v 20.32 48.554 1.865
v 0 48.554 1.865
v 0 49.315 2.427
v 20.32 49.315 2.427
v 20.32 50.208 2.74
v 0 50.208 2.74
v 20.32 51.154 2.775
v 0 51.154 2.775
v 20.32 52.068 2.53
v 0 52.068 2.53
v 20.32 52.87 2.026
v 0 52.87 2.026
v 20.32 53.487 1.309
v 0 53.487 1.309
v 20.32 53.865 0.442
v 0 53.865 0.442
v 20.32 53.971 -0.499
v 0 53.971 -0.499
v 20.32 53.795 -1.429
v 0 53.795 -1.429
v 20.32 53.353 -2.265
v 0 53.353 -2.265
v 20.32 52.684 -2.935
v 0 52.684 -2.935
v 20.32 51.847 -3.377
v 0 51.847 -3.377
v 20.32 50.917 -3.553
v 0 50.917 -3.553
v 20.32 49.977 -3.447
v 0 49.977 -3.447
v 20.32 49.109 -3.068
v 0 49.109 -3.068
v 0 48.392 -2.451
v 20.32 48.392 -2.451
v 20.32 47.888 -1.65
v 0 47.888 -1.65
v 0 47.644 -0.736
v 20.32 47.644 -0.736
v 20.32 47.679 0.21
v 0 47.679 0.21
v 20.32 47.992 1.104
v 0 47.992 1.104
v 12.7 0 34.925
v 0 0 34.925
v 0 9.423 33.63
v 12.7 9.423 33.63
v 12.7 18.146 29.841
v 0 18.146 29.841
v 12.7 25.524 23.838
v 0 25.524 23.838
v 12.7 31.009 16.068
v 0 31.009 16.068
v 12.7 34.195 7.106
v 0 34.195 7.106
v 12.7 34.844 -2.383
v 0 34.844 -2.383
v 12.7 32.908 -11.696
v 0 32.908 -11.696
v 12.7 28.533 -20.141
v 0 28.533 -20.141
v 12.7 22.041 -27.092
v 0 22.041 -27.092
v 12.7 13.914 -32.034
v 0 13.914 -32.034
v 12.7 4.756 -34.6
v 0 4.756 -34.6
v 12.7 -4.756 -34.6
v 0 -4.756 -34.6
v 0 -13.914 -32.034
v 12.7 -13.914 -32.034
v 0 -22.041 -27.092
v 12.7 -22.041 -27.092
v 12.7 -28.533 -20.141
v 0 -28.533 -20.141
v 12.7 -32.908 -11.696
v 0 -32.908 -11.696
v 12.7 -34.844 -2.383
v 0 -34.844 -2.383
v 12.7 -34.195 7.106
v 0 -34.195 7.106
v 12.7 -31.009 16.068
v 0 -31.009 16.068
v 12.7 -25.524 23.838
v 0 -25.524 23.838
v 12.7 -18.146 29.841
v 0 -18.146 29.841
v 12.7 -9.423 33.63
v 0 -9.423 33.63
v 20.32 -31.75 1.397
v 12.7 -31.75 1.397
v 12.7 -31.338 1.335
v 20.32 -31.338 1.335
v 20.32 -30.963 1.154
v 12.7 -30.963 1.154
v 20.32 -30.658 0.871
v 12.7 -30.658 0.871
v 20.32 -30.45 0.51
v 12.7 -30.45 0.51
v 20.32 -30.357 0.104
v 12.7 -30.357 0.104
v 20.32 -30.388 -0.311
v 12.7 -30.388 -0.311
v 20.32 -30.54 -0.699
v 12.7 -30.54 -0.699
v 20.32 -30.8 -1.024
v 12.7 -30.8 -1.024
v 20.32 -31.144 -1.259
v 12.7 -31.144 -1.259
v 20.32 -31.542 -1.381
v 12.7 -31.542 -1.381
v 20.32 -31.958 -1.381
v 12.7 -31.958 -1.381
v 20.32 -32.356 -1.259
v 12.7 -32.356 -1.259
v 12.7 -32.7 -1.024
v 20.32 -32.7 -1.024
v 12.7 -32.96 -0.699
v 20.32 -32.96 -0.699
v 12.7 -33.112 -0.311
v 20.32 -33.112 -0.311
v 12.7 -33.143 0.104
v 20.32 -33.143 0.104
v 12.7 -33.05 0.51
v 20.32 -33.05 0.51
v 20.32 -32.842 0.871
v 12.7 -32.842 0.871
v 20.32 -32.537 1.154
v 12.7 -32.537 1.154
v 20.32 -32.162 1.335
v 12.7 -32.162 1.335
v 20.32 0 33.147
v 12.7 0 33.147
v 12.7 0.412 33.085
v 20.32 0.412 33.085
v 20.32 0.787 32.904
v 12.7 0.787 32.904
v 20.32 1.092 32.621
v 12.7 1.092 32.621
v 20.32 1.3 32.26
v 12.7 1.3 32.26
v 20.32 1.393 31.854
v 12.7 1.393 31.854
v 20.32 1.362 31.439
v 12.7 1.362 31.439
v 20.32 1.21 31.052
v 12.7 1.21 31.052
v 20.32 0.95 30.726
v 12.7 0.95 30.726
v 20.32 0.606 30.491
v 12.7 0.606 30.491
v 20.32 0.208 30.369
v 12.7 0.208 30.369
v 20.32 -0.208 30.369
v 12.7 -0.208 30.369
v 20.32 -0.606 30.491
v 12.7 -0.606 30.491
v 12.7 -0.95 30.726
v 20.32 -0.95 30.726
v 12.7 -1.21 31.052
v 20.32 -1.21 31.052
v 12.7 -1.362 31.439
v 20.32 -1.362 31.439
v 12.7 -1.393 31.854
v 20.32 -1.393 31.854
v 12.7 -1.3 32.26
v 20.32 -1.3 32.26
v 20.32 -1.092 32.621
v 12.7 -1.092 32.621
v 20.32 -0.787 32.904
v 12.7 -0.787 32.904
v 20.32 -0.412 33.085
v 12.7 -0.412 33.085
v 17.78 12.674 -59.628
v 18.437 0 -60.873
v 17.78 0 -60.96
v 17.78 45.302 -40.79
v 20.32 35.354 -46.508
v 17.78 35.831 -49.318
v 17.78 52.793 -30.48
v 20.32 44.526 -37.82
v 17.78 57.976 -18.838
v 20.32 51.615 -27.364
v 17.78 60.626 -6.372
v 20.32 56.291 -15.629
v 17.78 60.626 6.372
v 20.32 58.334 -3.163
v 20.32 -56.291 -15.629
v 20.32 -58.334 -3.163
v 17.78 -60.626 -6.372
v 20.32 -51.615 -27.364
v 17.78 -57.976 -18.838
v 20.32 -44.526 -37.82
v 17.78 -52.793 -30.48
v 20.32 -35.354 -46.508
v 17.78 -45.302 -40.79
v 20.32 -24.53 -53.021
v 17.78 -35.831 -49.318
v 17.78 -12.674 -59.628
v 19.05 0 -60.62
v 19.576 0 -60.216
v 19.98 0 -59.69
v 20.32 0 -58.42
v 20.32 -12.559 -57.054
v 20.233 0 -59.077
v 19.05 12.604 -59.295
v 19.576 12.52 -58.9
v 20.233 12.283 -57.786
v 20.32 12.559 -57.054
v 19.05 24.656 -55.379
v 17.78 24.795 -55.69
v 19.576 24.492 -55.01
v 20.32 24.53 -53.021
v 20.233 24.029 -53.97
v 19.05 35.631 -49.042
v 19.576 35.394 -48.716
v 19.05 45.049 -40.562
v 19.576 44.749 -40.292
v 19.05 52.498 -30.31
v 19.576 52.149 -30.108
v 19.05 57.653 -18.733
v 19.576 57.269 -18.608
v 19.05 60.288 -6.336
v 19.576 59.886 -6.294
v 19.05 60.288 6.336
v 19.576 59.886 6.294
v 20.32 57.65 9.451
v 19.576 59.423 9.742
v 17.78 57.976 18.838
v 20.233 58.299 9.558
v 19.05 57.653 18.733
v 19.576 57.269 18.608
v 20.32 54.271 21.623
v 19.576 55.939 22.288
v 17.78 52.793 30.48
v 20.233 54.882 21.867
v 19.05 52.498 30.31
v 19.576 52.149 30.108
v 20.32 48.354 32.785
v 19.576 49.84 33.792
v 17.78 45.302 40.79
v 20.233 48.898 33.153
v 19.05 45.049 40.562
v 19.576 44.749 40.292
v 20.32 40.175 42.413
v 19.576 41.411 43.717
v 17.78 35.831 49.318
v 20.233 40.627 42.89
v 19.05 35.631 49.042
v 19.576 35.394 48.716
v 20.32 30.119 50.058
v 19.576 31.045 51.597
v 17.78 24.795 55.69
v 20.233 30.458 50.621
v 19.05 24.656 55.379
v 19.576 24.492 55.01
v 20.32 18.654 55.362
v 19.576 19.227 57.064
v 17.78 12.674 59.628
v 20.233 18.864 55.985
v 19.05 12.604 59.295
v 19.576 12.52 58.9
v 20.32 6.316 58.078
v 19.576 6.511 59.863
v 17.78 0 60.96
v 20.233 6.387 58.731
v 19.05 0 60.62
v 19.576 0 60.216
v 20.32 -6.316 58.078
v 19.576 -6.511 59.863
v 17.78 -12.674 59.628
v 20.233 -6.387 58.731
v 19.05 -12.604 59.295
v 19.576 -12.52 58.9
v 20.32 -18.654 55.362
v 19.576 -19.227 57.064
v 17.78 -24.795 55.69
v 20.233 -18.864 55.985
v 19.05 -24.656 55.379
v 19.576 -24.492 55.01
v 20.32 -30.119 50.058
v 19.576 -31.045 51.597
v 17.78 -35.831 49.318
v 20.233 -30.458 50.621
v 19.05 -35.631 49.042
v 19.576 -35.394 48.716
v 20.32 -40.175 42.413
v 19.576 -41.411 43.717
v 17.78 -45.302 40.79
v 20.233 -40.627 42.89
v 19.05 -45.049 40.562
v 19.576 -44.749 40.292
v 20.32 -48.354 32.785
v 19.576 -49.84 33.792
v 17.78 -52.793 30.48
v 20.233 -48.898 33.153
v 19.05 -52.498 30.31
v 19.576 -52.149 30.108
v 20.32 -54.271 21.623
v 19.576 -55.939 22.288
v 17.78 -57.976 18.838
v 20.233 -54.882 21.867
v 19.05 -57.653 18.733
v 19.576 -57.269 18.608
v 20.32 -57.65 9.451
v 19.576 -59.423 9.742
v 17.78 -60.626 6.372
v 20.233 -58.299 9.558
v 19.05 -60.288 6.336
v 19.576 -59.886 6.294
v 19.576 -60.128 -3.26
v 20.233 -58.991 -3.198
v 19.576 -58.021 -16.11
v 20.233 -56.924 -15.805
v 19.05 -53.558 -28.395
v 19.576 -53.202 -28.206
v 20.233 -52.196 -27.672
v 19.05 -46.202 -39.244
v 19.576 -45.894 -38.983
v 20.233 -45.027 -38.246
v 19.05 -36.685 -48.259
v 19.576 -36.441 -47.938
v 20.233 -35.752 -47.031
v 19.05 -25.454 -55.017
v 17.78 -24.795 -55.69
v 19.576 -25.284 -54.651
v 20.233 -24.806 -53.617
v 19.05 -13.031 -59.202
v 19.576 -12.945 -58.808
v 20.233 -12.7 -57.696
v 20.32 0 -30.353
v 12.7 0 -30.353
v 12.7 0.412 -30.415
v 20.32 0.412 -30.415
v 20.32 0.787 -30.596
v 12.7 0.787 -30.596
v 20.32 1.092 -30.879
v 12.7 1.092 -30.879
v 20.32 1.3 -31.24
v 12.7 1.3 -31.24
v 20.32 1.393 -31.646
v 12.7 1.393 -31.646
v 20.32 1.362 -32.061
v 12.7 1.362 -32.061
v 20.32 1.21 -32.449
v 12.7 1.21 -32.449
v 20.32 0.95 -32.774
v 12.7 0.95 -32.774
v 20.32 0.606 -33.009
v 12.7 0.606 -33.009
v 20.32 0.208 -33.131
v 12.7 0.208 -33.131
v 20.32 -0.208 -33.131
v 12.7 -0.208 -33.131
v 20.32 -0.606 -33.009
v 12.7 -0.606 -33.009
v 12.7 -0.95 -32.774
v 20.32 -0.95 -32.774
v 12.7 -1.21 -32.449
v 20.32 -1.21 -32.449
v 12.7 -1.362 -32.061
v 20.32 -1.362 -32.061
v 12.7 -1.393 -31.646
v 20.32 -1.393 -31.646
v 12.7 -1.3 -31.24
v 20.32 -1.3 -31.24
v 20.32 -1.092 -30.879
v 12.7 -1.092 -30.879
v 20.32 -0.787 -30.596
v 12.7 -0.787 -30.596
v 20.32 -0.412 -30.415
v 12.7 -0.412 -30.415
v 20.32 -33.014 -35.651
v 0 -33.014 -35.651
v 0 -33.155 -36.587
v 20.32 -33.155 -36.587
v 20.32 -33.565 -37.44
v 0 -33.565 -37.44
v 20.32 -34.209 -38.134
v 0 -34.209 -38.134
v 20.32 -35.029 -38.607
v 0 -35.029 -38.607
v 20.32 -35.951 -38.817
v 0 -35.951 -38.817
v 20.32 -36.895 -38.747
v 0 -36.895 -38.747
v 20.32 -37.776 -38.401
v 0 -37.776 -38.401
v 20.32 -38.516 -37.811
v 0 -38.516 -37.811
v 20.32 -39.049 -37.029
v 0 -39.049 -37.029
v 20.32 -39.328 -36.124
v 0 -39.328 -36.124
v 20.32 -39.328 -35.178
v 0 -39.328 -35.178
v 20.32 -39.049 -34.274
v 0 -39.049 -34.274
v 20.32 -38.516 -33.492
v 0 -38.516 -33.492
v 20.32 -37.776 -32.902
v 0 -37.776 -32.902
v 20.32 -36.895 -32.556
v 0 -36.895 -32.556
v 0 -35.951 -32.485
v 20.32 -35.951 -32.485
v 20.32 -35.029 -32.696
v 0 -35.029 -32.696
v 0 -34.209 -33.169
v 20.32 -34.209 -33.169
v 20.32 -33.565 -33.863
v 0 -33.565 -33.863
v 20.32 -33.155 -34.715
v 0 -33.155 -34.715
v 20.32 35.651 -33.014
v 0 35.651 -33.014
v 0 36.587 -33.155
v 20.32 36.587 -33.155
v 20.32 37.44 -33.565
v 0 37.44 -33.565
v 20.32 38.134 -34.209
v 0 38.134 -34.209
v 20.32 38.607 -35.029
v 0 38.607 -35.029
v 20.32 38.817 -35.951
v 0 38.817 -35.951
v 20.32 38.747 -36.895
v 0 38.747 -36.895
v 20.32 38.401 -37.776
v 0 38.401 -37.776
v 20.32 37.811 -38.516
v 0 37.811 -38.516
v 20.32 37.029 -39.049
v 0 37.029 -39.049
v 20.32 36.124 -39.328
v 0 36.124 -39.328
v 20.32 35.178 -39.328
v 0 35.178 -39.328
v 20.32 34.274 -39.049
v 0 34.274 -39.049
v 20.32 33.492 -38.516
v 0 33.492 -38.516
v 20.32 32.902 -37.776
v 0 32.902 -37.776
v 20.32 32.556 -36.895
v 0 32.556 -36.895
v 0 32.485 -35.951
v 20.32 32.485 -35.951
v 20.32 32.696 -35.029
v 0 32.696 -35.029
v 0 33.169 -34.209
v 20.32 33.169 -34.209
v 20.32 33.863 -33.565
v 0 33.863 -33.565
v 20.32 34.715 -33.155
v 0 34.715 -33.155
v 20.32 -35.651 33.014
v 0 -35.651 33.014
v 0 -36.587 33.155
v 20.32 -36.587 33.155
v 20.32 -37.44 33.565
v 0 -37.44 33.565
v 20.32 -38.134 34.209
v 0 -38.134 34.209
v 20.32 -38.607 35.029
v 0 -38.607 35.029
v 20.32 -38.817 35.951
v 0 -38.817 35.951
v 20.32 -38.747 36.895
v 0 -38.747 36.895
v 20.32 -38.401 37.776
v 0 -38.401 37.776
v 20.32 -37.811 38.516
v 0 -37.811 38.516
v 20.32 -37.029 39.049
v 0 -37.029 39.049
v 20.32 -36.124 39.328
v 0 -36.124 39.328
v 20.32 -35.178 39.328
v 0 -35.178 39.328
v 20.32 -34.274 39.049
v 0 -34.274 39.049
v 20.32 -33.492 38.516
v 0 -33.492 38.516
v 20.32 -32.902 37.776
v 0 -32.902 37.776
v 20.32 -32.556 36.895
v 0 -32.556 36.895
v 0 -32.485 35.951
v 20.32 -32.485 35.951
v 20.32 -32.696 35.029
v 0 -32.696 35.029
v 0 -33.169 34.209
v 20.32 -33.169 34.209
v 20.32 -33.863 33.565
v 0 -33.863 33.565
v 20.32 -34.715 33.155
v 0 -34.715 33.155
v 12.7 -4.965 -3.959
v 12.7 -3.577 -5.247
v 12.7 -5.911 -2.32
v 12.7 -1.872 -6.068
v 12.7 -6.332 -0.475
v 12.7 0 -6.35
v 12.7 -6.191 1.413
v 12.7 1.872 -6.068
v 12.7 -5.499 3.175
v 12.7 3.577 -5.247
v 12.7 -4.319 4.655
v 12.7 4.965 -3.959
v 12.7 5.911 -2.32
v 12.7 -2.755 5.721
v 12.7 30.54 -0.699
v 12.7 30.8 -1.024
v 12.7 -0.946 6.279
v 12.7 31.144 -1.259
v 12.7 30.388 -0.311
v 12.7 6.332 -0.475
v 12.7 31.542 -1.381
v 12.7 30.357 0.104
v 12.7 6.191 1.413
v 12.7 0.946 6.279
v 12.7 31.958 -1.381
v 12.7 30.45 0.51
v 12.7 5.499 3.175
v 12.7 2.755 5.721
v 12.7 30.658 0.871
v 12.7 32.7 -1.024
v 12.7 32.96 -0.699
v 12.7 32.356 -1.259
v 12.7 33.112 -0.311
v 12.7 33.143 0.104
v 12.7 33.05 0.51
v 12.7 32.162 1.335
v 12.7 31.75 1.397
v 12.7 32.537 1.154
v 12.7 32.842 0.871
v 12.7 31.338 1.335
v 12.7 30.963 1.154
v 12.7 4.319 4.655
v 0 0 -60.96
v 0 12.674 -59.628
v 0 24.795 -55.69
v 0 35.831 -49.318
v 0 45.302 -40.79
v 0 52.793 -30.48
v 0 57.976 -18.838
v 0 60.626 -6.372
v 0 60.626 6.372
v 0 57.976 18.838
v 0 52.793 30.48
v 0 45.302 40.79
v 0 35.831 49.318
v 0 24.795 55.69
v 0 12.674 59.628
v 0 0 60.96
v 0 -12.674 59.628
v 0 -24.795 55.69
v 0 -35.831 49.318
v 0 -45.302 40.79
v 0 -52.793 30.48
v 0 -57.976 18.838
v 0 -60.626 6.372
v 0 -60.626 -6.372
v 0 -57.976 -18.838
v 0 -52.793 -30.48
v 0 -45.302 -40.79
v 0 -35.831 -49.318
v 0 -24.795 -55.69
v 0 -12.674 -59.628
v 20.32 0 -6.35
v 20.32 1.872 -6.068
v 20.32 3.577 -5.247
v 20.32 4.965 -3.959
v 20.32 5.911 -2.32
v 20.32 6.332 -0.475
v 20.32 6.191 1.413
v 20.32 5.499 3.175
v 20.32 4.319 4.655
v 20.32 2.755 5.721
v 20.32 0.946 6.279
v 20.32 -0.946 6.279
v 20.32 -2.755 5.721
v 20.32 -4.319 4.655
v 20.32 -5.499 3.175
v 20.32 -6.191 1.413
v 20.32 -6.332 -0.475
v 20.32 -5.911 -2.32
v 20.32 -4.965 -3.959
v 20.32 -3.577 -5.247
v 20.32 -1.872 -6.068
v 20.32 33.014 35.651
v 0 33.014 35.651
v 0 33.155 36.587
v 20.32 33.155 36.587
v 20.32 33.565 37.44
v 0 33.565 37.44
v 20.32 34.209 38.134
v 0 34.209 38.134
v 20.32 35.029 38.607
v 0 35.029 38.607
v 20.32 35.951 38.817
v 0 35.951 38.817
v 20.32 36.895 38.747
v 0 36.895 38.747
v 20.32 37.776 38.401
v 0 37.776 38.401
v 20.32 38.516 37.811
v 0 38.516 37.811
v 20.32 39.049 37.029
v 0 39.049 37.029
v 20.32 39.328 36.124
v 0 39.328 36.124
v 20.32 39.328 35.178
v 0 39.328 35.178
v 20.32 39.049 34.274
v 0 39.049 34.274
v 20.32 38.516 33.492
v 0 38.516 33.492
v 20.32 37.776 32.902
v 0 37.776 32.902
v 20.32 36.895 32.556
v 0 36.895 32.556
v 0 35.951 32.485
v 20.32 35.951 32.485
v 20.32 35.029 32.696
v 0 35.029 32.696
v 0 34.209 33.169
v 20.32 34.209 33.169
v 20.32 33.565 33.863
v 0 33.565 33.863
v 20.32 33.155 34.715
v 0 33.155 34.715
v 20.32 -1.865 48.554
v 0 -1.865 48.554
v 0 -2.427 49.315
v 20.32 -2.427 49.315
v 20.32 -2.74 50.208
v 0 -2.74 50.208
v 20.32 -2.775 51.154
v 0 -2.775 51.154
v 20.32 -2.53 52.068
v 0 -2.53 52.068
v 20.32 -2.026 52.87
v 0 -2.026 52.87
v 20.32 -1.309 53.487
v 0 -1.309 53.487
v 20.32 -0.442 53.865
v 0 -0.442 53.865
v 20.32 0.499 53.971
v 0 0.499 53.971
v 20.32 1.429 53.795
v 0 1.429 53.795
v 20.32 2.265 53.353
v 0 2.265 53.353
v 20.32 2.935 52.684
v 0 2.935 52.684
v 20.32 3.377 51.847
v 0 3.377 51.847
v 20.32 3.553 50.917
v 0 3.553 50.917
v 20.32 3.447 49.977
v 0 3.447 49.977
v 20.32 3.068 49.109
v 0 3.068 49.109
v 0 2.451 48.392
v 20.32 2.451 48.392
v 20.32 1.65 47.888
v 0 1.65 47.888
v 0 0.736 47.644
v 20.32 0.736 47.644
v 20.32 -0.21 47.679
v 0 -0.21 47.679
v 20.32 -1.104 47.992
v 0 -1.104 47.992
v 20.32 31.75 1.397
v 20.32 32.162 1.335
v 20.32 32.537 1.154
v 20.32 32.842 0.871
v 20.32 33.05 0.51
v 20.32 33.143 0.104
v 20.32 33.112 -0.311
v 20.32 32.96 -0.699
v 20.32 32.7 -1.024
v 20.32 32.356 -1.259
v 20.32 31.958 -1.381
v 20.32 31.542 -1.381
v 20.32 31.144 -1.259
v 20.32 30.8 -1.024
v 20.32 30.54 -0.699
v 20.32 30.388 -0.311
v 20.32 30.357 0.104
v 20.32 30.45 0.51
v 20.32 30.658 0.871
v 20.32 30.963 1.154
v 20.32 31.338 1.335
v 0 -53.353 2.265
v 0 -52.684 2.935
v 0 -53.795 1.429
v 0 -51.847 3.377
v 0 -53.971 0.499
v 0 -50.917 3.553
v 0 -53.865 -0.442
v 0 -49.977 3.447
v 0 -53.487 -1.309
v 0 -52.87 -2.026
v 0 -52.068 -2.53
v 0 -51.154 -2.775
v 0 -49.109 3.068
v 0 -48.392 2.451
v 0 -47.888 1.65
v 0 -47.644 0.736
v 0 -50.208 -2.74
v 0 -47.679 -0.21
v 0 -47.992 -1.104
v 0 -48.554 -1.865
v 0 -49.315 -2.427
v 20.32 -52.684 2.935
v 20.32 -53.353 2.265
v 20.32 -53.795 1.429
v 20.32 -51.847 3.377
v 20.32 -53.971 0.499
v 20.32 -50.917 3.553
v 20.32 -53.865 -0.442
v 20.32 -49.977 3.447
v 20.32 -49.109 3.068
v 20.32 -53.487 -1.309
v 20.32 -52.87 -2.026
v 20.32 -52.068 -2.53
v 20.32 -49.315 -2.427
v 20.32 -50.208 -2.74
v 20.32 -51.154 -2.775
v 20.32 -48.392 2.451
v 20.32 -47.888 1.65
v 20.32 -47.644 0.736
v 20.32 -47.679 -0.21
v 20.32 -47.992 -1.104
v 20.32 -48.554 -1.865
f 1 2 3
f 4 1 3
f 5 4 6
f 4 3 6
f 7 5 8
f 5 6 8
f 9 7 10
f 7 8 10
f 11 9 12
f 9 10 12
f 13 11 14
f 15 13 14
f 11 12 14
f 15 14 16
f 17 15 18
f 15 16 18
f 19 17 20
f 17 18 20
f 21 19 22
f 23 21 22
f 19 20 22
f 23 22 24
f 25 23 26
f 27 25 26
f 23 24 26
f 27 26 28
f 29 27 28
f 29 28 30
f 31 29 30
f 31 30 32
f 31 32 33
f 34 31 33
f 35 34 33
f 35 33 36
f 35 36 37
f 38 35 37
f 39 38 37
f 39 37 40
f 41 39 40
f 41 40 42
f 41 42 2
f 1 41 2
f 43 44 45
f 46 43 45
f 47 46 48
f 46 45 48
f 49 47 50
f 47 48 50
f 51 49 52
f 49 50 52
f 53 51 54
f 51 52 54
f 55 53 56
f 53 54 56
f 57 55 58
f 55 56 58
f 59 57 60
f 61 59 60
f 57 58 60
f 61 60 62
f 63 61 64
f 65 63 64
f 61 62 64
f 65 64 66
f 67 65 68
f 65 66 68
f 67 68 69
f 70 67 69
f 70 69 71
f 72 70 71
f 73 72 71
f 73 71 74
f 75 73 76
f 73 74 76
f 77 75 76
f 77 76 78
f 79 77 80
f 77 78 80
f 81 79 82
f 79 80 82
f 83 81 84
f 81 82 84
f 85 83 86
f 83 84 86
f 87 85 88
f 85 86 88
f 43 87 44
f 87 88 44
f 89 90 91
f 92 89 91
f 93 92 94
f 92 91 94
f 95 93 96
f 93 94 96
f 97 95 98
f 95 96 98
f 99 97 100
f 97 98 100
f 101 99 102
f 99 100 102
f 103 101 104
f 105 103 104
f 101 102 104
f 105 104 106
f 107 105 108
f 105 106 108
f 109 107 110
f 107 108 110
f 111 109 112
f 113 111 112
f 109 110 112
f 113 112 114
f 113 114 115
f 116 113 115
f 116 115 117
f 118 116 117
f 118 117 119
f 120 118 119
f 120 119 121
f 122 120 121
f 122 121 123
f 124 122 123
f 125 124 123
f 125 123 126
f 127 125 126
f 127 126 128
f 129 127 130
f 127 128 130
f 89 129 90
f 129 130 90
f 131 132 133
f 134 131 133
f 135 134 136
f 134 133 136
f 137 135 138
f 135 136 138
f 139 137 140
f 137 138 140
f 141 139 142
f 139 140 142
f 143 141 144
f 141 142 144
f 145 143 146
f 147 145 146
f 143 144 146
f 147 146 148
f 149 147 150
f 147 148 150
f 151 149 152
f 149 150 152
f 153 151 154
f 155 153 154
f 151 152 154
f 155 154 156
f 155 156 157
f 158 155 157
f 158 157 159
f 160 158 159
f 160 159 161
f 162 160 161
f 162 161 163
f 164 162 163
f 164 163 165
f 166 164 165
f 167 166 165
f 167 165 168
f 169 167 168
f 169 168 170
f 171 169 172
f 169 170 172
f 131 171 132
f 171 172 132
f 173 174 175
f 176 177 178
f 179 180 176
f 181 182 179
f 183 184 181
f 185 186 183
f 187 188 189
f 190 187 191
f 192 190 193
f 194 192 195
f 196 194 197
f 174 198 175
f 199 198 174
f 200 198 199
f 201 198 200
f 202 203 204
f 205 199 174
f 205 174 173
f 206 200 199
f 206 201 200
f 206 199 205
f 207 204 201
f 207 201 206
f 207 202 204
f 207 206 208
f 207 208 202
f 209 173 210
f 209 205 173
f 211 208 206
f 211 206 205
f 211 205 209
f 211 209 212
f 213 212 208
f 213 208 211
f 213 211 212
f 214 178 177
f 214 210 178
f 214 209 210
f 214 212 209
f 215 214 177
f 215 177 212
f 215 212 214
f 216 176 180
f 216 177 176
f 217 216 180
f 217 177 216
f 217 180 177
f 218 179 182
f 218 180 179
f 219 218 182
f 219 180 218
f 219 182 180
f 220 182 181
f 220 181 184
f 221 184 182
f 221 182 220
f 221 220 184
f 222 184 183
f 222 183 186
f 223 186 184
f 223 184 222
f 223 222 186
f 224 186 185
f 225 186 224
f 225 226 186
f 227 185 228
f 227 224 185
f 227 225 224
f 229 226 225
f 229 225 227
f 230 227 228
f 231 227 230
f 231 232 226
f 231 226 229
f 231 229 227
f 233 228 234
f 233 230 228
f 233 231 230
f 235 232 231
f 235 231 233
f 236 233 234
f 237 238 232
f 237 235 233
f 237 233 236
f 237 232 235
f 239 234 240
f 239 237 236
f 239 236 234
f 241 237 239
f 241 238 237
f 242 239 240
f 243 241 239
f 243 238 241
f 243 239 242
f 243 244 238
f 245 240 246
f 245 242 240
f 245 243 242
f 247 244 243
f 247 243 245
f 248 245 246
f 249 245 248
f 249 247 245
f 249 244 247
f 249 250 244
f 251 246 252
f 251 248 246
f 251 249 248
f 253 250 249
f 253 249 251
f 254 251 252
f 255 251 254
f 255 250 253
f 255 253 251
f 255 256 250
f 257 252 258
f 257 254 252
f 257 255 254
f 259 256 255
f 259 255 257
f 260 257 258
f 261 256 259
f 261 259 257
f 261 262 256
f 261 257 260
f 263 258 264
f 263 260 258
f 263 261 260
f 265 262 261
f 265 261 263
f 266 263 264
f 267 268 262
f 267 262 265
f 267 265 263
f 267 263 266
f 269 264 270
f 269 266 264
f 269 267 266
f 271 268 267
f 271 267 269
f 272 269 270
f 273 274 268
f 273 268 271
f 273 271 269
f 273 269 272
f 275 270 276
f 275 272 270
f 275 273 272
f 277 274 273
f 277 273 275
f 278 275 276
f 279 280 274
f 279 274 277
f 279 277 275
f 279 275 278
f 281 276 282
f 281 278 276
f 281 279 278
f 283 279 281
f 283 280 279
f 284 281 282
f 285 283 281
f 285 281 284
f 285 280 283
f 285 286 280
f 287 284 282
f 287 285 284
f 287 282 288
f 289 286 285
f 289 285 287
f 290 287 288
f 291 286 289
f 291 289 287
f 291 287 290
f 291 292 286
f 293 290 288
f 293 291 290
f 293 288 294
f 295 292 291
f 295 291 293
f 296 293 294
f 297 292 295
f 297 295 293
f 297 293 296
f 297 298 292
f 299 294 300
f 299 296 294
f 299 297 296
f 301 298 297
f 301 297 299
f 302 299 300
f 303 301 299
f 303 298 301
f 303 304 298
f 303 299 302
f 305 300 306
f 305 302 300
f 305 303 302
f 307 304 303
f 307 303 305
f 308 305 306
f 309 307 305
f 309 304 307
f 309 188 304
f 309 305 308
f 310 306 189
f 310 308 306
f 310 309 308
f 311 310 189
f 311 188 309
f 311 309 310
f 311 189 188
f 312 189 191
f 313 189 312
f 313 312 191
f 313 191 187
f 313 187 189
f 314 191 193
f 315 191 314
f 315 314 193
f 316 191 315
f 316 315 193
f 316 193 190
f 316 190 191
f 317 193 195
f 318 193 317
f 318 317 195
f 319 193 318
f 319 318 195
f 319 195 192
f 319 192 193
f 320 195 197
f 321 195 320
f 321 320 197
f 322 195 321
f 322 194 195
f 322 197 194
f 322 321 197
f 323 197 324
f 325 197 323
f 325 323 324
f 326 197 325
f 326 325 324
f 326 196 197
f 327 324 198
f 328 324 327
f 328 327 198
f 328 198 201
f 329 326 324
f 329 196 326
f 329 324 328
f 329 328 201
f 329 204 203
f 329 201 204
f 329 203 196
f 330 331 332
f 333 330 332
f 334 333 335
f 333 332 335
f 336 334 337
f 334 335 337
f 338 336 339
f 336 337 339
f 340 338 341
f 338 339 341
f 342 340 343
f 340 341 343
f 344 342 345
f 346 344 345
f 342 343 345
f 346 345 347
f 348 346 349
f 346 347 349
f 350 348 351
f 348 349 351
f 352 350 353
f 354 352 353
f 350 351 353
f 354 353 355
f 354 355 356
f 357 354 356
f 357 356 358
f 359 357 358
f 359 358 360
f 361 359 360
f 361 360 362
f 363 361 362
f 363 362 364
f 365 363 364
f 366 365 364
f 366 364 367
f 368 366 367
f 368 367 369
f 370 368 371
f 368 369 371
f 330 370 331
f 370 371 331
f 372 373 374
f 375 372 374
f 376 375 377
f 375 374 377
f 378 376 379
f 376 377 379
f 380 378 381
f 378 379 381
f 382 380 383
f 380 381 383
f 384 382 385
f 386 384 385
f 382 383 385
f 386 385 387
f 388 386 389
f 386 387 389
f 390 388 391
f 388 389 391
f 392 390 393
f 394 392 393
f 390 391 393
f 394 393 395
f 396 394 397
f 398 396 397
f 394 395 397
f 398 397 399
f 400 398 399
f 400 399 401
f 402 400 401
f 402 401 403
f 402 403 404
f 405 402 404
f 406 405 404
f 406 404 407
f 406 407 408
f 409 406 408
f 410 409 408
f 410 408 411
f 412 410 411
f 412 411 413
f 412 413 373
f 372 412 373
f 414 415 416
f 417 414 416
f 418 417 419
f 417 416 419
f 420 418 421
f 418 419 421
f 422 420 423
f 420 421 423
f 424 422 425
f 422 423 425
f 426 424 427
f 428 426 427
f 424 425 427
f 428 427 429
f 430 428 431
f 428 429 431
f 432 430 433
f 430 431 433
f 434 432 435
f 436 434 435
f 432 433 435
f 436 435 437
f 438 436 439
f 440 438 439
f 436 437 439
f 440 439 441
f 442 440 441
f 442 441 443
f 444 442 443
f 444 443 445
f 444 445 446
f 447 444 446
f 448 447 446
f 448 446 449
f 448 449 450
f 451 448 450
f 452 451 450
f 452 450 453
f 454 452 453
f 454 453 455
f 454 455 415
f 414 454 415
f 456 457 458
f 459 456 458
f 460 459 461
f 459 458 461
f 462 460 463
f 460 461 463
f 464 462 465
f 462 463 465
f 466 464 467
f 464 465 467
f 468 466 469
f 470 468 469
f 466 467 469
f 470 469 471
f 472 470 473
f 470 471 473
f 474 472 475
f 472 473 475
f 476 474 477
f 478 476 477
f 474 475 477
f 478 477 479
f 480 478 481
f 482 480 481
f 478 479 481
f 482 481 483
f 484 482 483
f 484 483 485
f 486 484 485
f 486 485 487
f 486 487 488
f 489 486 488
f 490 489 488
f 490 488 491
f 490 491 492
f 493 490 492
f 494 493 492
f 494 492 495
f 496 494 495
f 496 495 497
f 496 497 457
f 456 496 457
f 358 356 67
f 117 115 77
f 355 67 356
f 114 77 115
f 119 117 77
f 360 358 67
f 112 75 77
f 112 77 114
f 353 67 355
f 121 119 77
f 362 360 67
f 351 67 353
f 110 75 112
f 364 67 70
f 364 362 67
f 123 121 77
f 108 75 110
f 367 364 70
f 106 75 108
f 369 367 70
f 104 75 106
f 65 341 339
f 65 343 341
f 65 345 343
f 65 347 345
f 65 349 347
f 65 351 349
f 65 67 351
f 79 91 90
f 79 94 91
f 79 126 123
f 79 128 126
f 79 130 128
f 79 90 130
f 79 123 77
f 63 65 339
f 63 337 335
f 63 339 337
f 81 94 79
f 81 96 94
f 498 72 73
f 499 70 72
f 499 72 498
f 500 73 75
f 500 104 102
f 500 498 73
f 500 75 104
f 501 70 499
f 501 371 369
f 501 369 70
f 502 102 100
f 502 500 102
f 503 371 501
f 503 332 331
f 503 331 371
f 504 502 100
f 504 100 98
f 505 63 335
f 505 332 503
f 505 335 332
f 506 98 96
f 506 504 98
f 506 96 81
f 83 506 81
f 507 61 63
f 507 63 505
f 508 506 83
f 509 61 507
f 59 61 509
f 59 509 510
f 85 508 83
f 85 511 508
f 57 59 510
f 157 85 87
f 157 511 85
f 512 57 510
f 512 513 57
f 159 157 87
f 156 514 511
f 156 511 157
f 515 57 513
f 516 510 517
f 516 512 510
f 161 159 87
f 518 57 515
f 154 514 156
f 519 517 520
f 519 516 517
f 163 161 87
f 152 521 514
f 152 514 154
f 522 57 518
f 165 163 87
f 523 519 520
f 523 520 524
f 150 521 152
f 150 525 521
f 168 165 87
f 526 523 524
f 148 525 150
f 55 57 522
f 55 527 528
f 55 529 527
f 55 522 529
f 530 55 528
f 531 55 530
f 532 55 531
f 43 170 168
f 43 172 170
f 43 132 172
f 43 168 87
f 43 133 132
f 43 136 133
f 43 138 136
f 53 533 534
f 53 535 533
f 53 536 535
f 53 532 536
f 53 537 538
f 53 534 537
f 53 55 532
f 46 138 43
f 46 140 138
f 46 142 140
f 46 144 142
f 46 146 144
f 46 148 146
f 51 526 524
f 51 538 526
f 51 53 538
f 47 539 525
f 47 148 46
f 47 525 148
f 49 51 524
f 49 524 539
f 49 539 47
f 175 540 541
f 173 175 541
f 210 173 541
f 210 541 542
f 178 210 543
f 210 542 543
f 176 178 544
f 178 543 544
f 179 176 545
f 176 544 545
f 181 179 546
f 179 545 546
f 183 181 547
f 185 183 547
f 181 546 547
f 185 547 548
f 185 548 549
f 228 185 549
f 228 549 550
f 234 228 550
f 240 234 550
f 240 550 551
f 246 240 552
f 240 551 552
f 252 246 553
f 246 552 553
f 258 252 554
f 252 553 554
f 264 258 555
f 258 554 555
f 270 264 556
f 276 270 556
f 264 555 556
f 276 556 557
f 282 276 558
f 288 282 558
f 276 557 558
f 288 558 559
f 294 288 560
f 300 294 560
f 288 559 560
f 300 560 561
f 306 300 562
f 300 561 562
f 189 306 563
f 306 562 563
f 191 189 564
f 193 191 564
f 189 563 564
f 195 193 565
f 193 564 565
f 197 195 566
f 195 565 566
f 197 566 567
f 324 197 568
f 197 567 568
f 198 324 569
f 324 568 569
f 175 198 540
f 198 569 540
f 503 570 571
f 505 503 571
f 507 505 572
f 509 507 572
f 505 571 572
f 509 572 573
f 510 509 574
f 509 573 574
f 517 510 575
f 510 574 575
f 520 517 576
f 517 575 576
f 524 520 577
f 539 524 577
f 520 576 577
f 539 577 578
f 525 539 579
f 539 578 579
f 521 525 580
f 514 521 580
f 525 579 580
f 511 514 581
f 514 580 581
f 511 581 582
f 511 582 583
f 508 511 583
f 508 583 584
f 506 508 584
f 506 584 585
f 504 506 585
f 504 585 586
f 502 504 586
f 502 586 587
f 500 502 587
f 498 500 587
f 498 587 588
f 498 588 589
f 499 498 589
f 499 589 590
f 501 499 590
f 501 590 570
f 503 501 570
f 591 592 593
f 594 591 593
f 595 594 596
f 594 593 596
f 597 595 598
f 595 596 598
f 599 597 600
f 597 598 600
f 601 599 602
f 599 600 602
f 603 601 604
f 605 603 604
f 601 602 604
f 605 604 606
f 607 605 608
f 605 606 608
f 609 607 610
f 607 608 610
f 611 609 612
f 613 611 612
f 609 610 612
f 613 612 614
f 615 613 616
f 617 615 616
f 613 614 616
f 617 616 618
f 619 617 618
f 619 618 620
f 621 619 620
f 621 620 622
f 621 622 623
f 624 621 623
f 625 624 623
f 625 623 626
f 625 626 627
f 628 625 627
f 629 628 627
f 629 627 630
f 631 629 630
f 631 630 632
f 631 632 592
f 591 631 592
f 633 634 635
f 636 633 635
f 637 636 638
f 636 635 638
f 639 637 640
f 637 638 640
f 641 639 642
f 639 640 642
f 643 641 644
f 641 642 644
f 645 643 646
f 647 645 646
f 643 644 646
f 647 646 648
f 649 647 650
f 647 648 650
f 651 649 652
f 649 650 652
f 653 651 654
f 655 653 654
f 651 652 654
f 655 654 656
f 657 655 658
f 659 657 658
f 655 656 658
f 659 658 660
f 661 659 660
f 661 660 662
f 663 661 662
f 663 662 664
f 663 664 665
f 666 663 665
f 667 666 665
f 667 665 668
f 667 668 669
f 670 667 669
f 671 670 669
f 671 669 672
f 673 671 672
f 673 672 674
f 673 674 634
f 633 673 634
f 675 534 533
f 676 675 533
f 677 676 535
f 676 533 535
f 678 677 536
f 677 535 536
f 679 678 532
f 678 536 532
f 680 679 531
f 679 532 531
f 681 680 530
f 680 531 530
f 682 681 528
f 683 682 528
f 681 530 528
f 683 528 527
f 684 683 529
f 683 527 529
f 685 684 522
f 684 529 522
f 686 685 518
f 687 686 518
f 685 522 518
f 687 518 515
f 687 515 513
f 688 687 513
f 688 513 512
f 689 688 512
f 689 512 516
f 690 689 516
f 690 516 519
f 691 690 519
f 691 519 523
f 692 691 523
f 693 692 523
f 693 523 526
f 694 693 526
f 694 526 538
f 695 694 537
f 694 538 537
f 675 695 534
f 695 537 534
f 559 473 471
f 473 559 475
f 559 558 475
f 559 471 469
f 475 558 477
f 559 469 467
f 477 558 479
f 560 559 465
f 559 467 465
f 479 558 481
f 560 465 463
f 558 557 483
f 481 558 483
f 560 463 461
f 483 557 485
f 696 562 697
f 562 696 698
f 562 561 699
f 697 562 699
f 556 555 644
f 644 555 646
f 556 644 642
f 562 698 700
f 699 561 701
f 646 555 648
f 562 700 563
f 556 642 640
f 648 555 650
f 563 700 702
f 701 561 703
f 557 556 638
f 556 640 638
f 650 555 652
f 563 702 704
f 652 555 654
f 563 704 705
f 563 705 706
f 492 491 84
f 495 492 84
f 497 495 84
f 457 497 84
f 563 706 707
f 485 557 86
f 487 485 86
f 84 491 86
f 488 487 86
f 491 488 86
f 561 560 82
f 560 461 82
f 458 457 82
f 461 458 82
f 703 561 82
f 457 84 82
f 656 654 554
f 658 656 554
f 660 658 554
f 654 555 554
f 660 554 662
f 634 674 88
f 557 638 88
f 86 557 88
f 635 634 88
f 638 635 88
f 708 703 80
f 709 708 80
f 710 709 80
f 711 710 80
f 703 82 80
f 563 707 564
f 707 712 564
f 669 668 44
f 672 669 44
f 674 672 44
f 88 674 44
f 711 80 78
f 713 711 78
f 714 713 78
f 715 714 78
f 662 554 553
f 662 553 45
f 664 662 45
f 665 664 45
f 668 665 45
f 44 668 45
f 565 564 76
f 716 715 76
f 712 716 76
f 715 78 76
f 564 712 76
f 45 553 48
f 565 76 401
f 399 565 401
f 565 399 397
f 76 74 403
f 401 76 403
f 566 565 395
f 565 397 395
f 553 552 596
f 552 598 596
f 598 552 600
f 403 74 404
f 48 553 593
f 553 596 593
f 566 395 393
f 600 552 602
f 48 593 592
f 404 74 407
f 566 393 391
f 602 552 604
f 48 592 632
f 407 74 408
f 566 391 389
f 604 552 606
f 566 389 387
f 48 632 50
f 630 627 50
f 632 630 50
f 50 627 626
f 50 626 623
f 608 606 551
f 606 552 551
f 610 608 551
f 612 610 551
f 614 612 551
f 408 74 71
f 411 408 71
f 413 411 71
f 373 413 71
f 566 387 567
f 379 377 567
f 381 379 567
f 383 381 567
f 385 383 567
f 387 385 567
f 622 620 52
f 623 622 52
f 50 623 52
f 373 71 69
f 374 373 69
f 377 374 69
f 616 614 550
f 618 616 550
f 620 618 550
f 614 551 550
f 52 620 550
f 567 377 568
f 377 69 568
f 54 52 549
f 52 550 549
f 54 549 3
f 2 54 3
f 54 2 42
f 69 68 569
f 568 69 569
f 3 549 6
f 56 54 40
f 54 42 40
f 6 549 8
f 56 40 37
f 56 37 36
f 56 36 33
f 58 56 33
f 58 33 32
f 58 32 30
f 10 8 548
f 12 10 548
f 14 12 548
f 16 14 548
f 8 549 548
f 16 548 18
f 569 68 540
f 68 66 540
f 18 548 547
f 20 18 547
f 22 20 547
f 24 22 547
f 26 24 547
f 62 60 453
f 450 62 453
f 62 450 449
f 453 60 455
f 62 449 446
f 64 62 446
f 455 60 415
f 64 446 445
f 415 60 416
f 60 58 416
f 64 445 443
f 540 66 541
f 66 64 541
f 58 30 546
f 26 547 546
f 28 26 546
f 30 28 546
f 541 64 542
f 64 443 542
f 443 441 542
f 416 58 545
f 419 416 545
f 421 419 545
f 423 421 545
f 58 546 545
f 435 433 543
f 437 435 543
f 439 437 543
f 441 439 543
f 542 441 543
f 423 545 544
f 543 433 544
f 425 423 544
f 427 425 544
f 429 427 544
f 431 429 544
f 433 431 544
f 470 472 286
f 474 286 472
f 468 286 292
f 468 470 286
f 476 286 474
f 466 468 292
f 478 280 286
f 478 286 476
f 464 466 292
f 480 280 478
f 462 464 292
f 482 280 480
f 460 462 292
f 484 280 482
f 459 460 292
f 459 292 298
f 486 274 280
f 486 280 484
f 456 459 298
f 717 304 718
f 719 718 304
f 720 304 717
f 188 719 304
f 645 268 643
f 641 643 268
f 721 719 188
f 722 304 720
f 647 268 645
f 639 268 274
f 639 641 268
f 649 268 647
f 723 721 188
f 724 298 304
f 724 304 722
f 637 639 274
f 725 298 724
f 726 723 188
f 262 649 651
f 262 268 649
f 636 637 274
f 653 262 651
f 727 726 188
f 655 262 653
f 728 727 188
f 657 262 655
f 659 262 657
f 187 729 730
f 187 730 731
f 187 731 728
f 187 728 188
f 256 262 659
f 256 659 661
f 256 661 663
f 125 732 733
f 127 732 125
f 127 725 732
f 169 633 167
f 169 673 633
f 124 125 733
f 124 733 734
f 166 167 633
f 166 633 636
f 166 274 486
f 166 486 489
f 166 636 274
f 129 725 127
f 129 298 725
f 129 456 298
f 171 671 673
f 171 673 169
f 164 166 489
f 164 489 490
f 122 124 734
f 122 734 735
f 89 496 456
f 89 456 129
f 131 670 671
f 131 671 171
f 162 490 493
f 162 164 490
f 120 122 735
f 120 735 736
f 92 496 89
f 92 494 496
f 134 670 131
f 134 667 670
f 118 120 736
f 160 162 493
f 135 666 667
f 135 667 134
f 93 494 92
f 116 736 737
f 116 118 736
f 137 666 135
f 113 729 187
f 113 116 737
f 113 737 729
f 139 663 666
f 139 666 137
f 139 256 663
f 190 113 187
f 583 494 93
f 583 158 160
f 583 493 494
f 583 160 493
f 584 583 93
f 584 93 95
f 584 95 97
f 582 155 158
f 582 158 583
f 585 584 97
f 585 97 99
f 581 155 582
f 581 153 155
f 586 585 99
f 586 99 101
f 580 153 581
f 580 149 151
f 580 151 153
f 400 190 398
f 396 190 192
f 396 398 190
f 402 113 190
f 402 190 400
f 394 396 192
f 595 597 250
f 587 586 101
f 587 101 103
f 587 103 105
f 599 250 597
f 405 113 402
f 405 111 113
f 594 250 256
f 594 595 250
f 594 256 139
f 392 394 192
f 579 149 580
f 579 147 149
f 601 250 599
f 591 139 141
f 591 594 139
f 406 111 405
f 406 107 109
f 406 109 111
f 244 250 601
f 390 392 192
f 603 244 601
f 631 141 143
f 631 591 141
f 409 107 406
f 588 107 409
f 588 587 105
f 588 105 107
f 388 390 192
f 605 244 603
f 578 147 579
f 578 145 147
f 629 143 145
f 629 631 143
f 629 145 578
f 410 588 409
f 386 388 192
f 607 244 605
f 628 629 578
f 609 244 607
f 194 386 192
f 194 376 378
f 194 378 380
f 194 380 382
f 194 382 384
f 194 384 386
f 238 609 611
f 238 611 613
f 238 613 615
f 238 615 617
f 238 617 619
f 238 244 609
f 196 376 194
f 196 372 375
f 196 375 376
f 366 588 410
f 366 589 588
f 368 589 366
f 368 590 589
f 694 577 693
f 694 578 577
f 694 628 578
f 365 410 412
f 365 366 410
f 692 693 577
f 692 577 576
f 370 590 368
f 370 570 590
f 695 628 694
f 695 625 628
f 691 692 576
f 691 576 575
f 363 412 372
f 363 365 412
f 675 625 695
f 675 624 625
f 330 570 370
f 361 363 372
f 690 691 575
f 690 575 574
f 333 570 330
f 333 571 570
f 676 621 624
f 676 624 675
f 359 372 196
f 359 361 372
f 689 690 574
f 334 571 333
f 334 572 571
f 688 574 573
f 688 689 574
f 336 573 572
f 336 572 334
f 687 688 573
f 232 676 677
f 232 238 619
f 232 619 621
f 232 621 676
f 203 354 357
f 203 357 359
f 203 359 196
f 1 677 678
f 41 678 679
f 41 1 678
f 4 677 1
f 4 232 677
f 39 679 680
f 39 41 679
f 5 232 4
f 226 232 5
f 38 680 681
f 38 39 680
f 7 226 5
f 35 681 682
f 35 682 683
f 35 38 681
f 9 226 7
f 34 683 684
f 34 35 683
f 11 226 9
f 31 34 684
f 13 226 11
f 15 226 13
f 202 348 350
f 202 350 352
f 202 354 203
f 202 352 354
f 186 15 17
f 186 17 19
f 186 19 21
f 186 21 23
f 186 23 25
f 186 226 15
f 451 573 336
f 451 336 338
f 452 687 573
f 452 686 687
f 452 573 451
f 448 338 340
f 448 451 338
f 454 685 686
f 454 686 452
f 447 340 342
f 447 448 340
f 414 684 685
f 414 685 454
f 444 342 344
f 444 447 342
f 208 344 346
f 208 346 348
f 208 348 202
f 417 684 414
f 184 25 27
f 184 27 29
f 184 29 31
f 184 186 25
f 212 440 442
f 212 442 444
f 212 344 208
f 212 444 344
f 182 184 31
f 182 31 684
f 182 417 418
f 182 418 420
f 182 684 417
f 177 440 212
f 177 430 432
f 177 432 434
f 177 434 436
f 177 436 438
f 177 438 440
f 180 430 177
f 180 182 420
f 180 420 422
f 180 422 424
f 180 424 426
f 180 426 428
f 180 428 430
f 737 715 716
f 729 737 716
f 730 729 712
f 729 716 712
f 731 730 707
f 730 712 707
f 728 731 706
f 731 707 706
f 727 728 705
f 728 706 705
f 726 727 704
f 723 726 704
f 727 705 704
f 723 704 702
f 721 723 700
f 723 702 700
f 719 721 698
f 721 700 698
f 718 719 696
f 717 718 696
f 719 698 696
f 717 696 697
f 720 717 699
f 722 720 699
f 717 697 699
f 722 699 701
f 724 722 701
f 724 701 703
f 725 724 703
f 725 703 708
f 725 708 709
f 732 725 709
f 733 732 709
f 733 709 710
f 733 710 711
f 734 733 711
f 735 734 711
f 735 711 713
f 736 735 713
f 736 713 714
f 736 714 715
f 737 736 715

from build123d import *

# Parameters (mm, degrees)
SKETCH1_R           = 60.96
BOSS_EXTRUDE1_DEPTH = 20.32
FILLET1_R           = 2.54
SKETCH2_R           = 4.508
CUT_EXTRUDE1_DEPTH  = 6.35
SKETCH4_R           = 6.35
CUT_EXTRUDE3_DEPTH  = 89.572826533
SKETCH5_R           = 3.175
CUT_EXTRUDE4_DEPTH  = 89.572826533
CIRPATTERN2_COUNT   = 8
SKETCH6_R           = 34.925
CUT_EXTRUDE5_DEPTH  = 12.7
SKETCH7_R           = 1.397
CUT_EXTRUDE6_DEPTH  = 7.62


with BuildPart() as part:
    # Sketch1 → Boss-Extrude1 (new body)
    with BuildSketch(Plane(origin=(0, 0, 0), x_dir=(0, 0, -1), z_dir=(1, 0, 0))):
        Circle(SKETCH1_R)
    extrude(amount=BOSS_EXTRUDE1_DEPTH)

    # Fillet1
    fillet1_edges = [part.edges().sort_by_distance(p)[0] for p in [
        (20.32, 0, 60.96),
    ]]
    fillet(fillet1_edges, radius=FILLET1_R)

    # Sketch2 → Cut-Extrude1 (cut)
    with BuildSketch(Plane(origin=(20.32, 0, 0), x_dir=(0, 0, -1), z_dir=(1, 0, 0))):
        Circle(SKETCH2_R)
    extrude(amount=-CUT_EXTRUDE1_DEPTH, mode=Mode.SUBTRACT)

    # Sketch4 → Cut-Extrude3 (cut, through all)
    with BuildSketch(Plane(origin=(20.32, 0, 0), x_dir=(0, 0, -1), z_dir=(1, 0, 0))):
        Circle(SKETCH4_R)
    extrude(amount=-CUT_EXTRUDE3_DEPTH, mode=Mode.SUBTRACT)

    # Sketch5 → Cut-Extrude4 (cut, through all)
    with BuildSketch(Plane.ZY):
        with Locations((-36.188764222, 35.651274088)):
            Circle(SKETCH5_R)
    cut_extrude4 = extrude(amount=-CUT_EXTRUDE4_DEPTH, mode=Mode.SUBTRACT)

    # CirPattern2: Cut-Extrude4 ×8 about axis, 1 skipped
    cirpattern2_axis = Axis((0, 0, 0), (1, 0, 0))
    add([cut_extrude4.rotate(cirpattern2_axis, i * 360 / CIRPATTERN2_COUNT) for i in range(1, CIRPATTERN2_COUNT) if i not in (7,)], mode=Mode.SUBTRACT)

    # Sketch6 → Cut-Extrude5 (cut)
    with BuildSketch(Plane.ZY):
        Circle(SKETCH6_R)
    extrude(amount=-CUT_EXTRUDE5_DEPTH, mode=Mode.SUBTRACT)

    # Sketch7 → Cut-Extrude6 (cut)
    with BuildSketch(Plane.ZY.offset(-12.7)):
        with Locations((0, 31.75)):
            Circle(SKETCH7_R)
        with Locations((31.75, 0)):
            Circle(SKETCH7_R)
        with Locations((0, -31.75)):
            Circle(SKETCH7_R)
        with Locations((-31.75, 0)):
            Circle(SKETCH7_R)
    extrude(amount=-CUT_EXTRUDE6_DEPTH, mode=Mode.SUBTRACT)


solid = part.part
